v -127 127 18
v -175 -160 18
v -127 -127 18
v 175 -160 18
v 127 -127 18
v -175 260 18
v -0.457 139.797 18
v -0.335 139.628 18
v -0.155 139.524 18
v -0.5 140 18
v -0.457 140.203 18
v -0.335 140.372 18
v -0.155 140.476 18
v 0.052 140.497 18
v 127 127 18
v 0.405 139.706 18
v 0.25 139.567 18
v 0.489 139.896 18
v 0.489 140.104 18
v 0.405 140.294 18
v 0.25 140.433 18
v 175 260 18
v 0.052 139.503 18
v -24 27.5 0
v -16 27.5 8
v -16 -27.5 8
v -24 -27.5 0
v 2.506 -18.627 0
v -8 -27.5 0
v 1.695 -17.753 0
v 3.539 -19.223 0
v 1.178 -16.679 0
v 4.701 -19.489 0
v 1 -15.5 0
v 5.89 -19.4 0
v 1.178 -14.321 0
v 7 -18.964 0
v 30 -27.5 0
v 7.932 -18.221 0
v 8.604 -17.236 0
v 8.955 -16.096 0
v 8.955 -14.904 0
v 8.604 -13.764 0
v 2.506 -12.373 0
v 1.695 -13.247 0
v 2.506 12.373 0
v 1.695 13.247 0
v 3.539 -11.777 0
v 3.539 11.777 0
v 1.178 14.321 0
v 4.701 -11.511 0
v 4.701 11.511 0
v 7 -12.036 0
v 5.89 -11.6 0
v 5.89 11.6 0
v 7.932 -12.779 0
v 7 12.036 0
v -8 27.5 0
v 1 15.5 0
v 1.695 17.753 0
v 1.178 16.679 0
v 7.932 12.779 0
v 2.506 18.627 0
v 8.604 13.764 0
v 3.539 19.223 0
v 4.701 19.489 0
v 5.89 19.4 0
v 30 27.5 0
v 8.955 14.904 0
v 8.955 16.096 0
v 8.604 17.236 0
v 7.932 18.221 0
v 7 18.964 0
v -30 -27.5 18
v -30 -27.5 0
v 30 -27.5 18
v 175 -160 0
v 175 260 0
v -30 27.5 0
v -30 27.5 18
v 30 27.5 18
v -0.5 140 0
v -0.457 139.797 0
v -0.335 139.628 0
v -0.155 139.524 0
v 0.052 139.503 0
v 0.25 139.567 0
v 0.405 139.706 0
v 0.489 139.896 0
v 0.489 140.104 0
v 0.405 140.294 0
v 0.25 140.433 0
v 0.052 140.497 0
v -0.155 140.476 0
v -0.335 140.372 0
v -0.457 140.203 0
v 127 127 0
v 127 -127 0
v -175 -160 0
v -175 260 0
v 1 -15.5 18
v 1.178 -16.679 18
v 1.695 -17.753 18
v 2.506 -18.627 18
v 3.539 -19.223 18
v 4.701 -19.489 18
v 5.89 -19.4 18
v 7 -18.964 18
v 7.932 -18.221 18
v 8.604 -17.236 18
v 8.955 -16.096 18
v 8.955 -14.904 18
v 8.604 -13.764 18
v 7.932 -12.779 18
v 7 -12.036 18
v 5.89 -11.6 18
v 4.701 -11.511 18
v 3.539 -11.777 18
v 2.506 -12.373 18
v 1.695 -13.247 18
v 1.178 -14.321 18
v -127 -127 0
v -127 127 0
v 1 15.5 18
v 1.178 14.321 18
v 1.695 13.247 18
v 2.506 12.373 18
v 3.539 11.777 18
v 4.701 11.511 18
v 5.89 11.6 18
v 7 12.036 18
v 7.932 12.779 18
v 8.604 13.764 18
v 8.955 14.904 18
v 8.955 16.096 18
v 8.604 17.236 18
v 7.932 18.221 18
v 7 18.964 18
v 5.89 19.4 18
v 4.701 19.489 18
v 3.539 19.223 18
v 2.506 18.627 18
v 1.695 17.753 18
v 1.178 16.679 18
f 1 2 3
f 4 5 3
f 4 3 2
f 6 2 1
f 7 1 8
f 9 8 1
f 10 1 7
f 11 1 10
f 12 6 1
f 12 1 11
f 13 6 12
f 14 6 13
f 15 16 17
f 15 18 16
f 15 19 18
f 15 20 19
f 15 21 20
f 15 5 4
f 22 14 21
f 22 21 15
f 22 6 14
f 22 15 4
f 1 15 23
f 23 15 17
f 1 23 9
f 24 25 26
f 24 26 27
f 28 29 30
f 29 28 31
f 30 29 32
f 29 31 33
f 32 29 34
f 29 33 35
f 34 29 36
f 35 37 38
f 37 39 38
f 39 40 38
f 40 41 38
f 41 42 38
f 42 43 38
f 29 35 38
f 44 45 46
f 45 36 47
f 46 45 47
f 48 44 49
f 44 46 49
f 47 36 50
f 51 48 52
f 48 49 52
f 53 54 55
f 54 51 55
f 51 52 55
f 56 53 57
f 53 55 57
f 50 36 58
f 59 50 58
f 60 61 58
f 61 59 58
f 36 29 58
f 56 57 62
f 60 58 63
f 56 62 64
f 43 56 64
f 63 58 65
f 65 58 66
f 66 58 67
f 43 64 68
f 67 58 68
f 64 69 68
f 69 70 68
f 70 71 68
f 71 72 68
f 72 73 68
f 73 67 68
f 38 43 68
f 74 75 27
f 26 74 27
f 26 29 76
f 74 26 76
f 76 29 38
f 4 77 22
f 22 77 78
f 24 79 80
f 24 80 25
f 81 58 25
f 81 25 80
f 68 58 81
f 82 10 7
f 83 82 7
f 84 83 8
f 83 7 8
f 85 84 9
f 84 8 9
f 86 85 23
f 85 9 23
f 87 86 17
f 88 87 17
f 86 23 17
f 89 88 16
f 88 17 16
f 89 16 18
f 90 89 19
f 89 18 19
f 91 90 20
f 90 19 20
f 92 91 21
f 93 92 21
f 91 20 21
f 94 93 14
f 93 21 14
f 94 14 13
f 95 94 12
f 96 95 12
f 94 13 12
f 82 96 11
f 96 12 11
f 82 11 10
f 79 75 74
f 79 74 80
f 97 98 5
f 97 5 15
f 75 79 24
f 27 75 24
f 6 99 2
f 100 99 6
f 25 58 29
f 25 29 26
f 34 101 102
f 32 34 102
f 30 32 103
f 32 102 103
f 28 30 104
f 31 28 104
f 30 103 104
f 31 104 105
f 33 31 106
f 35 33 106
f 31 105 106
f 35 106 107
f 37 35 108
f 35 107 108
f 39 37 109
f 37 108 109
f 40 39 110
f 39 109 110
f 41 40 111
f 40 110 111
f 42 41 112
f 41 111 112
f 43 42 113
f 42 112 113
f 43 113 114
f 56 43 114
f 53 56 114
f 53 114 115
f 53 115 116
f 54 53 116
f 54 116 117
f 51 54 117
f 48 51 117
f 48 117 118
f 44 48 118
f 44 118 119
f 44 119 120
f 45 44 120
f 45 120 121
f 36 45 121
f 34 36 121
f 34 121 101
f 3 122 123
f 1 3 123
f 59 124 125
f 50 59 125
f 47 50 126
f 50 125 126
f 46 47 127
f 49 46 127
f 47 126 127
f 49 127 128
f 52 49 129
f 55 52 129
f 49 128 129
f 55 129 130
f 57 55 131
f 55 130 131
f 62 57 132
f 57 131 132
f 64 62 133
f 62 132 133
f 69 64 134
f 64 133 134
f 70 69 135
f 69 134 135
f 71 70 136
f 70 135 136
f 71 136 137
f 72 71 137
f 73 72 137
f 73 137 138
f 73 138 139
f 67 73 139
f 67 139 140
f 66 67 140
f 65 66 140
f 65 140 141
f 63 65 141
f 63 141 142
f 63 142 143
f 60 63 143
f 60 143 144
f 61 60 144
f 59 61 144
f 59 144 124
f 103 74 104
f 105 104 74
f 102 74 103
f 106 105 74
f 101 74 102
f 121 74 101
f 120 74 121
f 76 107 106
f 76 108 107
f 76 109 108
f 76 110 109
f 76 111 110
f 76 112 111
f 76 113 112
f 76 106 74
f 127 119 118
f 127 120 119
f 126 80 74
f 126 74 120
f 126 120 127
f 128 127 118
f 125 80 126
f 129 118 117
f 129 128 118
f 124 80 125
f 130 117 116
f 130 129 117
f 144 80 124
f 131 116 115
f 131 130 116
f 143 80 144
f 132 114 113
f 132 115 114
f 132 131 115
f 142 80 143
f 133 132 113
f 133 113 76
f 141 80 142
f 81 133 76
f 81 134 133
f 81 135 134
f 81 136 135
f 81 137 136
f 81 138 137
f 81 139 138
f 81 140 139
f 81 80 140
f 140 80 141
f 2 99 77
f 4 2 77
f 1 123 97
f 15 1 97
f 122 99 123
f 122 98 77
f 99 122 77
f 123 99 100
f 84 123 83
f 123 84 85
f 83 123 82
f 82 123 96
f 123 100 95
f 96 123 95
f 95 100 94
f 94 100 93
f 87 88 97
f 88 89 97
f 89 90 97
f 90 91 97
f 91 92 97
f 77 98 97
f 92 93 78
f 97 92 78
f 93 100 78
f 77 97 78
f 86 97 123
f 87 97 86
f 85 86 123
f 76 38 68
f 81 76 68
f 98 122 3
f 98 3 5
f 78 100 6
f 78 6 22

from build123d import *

# Parameters (mm, degrees)
F0_W     = 350
F0_H     = 420
F0_W_2   = 254
F0_H_2   = 254
F1_DEPTH = 18
F2_D     = 1
F3_W     = 60
F3_H     = 55
F4_DEPTH = 18
F5_D     = 8
F7_DEPTH = 287.501


with BuildPart() as f1:
    # F0 (on Top) → F1 (new body)
    with BuildSketch(Plane.XY):
        with Locations((0, 50)):
            Rectangle(F0_W, F0_H)
        Rectangle(F0_W_2, F0_H_2, mode=Mode.SUBTRACT)
    extrude(amount=F1_DEPTH)

    # F2 (through all)
    with Locations(Plane(origin=(0, 0, 0), x_dir=(1, 0, 0), z_dir=(0, 0, -1))):
        with Locations((0, -140)):
            Hole(F2_D / 2)


with BuildPart() as f4:
    # F3 (on Top) → F4 (new body)
    with BuildSketch(Plane.XY):
        Rectangle(F3_W, F3_H)
    extrude(amount=F4_DEPTH)

    # F5 (through all)
    with Locations(Plane(origin=(0, 0, 0), x_dir=(1, 0, 0), z_dir=(0, 0, -1))):
        with Locations((5, -15.5), (5, 15.5)):
            Hole(F5_D / 2)

    # F6 (on face) → F7 (cut, through all)
    with BuildSketch(Plane.XZ.offset(27.5)):
        Polygon((-8, 0), (-16, 8), (-24, 0), align=None)
    extrude(amount=-F7_DEPTH, mode=Mode.SUBTRACT)


solid = Compound([f1.part, f4.part])
